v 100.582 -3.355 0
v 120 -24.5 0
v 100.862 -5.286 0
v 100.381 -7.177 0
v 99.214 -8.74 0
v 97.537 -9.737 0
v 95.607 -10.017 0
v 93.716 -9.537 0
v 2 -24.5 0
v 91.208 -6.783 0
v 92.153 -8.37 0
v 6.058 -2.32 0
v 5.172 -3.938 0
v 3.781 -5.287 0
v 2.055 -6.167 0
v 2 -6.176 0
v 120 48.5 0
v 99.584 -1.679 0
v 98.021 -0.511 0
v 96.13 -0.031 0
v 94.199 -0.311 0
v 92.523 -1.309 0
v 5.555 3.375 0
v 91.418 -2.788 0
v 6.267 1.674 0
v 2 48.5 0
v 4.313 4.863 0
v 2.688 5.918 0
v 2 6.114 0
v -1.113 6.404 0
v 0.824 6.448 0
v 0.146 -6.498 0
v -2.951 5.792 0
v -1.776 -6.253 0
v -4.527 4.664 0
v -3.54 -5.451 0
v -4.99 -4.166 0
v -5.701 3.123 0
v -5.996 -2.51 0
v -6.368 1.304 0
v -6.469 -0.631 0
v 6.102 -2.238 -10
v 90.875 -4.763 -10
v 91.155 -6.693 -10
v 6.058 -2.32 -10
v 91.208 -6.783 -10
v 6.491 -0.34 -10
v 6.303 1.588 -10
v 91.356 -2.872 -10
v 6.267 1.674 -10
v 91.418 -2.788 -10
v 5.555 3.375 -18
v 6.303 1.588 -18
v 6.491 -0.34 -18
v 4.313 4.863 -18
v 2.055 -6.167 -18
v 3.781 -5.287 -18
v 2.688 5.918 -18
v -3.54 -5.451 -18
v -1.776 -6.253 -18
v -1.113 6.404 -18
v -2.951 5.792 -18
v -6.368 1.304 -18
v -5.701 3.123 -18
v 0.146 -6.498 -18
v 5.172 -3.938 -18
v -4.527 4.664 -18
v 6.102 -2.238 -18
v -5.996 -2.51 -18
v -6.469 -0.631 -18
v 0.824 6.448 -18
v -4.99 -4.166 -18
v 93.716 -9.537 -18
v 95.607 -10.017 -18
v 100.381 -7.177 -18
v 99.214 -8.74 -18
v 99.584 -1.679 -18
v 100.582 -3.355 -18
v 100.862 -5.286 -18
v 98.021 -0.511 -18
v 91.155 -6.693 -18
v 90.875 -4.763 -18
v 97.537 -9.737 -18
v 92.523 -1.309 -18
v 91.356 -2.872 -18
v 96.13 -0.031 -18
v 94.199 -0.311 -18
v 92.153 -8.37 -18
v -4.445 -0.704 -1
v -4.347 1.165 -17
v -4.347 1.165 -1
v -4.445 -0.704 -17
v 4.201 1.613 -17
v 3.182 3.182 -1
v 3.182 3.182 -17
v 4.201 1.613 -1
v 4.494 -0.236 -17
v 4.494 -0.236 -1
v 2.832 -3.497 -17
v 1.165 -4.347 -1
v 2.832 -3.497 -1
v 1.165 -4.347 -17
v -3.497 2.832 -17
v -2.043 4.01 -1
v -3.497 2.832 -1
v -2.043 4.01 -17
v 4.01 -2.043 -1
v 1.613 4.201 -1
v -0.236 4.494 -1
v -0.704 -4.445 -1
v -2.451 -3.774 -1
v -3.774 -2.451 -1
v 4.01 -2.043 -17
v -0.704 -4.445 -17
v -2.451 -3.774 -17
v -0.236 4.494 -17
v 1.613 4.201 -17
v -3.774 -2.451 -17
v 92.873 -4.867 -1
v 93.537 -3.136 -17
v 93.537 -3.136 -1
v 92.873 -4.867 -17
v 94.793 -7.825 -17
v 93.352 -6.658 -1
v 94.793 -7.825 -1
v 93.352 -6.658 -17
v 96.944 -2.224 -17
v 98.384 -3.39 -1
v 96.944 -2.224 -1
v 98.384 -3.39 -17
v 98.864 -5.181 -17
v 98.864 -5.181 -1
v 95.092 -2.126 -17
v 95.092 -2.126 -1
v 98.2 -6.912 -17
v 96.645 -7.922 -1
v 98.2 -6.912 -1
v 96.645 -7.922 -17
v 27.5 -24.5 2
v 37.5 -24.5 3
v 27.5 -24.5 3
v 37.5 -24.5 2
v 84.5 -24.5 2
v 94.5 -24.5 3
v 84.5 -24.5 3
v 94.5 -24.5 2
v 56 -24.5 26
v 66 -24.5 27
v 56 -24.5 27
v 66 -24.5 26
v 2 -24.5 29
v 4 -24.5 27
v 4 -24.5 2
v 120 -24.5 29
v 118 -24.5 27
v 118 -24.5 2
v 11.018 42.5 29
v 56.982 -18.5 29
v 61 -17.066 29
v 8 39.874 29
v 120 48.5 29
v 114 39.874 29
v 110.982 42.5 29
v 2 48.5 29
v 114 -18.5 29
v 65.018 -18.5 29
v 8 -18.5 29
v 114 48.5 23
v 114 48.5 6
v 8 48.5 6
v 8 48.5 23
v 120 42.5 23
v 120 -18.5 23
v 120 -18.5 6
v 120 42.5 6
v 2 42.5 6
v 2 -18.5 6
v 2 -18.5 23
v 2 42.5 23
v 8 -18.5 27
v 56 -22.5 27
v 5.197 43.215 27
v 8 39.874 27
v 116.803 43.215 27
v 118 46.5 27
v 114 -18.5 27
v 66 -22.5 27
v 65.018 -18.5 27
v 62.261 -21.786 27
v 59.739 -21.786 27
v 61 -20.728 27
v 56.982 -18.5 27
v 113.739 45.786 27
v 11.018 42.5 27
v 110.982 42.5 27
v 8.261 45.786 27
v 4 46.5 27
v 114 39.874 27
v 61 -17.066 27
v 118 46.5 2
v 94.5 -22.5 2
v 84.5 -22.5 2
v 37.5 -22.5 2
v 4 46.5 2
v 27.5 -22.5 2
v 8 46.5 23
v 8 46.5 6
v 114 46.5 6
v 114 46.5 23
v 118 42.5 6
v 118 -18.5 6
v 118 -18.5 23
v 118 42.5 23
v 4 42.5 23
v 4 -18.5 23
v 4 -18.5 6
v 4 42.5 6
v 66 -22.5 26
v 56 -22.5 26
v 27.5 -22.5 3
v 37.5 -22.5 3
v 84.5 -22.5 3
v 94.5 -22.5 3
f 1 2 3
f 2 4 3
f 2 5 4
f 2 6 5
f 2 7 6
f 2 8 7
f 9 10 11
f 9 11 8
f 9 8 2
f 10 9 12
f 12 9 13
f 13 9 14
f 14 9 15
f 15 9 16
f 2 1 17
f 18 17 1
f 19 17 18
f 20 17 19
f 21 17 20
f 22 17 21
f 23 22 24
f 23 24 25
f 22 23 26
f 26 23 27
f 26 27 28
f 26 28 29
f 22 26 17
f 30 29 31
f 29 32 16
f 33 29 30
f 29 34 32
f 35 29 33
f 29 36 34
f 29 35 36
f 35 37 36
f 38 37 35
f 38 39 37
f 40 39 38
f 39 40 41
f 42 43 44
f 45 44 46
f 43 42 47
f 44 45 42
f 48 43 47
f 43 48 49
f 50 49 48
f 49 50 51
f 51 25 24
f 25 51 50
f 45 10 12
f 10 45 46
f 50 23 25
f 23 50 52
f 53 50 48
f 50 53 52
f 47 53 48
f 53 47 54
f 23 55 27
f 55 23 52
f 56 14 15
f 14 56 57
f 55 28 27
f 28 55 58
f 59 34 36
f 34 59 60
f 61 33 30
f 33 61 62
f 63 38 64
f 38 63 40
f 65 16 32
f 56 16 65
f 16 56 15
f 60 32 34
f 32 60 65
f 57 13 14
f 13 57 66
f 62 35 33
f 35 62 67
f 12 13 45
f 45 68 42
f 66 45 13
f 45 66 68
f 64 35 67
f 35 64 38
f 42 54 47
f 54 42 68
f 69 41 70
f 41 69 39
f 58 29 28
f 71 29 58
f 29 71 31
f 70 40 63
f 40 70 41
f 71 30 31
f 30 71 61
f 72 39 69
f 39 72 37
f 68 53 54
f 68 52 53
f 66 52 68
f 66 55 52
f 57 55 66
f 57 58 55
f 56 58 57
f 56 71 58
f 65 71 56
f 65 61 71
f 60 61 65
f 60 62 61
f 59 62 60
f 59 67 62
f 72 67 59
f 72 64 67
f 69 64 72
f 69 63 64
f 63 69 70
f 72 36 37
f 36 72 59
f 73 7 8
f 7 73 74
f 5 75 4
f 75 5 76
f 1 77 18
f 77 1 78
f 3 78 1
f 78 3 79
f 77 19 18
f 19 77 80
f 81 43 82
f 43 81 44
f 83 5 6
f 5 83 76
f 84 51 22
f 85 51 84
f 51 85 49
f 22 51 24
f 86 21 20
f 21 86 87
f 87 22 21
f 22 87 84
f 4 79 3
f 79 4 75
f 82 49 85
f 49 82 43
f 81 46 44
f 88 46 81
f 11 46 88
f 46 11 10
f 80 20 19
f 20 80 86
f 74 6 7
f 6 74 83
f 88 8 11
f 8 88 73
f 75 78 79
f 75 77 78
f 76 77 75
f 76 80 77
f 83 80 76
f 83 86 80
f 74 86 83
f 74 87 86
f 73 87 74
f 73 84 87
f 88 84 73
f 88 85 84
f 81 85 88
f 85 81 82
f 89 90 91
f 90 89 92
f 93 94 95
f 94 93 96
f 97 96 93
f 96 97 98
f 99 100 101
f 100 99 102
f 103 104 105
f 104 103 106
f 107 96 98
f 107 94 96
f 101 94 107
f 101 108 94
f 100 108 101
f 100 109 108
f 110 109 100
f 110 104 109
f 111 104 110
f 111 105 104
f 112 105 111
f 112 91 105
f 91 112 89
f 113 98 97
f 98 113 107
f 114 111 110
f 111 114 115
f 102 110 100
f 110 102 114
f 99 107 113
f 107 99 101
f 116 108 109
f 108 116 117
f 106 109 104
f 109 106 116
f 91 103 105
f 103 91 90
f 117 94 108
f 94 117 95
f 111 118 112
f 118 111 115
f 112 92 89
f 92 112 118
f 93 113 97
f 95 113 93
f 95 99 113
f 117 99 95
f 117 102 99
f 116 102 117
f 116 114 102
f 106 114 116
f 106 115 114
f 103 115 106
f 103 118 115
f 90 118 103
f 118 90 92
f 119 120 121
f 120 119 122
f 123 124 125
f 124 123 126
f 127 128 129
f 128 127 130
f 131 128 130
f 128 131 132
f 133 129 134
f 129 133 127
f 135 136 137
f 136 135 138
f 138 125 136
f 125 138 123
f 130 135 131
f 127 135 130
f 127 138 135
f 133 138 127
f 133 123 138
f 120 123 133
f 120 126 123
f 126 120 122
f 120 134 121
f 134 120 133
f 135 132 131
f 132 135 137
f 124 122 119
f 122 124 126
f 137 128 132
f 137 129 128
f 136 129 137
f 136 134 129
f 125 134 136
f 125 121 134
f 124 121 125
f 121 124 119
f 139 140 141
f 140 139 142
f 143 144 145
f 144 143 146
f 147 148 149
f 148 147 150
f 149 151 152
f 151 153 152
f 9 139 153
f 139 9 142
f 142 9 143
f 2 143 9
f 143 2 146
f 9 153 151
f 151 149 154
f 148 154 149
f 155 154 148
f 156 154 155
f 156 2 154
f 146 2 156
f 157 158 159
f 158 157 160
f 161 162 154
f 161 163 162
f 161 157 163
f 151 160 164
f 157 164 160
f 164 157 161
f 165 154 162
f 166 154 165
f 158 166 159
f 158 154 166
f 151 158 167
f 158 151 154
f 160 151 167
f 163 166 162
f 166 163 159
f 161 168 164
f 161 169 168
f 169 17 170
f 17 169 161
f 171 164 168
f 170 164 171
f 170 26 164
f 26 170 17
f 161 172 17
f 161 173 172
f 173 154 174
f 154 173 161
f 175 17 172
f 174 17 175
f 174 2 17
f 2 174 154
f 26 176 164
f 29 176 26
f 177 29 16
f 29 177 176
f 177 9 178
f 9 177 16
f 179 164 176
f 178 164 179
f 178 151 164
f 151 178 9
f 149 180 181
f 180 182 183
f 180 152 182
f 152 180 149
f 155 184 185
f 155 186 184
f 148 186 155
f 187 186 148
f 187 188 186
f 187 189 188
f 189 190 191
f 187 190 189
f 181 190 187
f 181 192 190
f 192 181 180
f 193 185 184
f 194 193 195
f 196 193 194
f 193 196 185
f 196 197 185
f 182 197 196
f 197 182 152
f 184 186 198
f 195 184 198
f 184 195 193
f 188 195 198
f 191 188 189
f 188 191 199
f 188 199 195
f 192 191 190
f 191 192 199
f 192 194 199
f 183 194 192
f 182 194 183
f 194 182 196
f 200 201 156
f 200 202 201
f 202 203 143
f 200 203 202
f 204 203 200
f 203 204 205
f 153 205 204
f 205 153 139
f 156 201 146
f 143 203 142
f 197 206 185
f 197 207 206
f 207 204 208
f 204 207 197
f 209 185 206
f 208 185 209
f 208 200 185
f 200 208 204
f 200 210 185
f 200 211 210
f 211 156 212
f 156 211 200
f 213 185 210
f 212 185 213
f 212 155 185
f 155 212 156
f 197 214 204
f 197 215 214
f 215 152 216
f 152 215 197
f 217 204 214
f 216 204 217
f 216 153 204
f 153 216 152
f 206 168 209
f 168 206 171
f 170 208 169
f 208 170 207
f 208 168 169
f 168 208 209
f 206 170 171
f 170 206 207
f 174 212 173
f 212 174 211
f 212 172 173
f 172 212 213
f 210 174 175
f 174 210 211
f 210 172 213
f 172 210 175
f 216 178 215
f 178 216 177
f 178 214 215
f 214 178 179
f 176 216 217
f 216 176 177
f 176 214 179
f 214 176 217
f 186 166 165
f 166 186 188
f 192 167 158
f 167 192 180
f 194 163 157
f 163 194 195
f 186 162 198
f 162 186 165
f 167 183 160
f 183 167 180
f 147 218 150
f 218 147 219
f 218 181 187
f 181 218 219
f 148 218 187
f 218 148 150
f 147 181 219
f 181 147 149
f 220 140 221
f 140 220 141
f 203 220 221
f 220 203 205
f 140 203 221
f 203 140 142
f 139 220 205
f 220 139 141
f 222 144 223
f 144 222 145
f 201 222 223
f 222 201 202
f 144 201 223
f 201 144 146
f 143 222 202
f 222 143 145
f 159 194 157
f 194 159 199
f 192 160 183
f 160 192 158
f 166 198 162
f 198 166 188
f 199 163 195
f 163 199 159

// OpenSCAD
// file: usb_switch_holder.scad
module cage() {
    difference() {
        cube([69 + 2 * 2, 114 + 2 * 2, 25 + 2 * 2], center=true);
        cube([69, 114, 25], center=true);

        translate([4, 0, 0]) cube([69, 114, 25], center=true);
        translate([-4, 0, 0]) cube([69, 114 - 2 * 4, 25 - 2 * 4], center=true);
        translate([0, 4, 0]) cube([69 - 2 * 4, 114, 25 - 2 * 4], center=true);
        translate([0, -4, 0]) cube([69 - 2 * 4, 114, 25 - 2 * 4], center=true);
        translate([0, 0, 4]) cube([69 - 2 * 4, 114 - 2 * 4, 25], center=true);

    }
    translate([69 / 2 + 1, 0, 25 / 2]) cube([2, 10, 2], center=true);
    translate([69 / 2 + 1, -114 / 4, -25 / 2]) cube([2, 10, 2], center=true);
    translate([69 / 2 + 1, 114 / 4, -25 / 2]) cube([2, 10, 2], center=true);

    translate([0, -27, 25 / 2 + 1]) rotate([0, 0, 40]) cube([60 * sqrt(2), 4, 2], center=true);
    translate([0, 27, 25 / 2 + 1]) rotate([0, 0, -40]) cube([60 * sqrt(2), 4, 2], center=true);
}
// main file
// The lower part of the USB switch holder.

use <usb_switch_holder.scad>

rotate([0, 0, -3]) translate([0, 0, -9]) difference() {
    union() {
        //rotate([45, 0, 0]) 
        translate([45, 0, 4]) cube([96, 4, 10], center=true);

        //rotate([-45, 0, 0]) translate([45, 0, 0]) cube([96, 2, 10], center=true);
        cylinder(h=18, r=6.5, center=true);
        translate([96, 0, 0]) cylinder(h=18, r=5, center=true);
    }
    cylinder(h=16, r=4.5, center=true);
    translate([96, 0, 0]) cylinder(h=16, r=3, center=true);
}

translate([43 + 18, 27 - 15, 14.5]) rotate([0, 0, -90]) cage();
